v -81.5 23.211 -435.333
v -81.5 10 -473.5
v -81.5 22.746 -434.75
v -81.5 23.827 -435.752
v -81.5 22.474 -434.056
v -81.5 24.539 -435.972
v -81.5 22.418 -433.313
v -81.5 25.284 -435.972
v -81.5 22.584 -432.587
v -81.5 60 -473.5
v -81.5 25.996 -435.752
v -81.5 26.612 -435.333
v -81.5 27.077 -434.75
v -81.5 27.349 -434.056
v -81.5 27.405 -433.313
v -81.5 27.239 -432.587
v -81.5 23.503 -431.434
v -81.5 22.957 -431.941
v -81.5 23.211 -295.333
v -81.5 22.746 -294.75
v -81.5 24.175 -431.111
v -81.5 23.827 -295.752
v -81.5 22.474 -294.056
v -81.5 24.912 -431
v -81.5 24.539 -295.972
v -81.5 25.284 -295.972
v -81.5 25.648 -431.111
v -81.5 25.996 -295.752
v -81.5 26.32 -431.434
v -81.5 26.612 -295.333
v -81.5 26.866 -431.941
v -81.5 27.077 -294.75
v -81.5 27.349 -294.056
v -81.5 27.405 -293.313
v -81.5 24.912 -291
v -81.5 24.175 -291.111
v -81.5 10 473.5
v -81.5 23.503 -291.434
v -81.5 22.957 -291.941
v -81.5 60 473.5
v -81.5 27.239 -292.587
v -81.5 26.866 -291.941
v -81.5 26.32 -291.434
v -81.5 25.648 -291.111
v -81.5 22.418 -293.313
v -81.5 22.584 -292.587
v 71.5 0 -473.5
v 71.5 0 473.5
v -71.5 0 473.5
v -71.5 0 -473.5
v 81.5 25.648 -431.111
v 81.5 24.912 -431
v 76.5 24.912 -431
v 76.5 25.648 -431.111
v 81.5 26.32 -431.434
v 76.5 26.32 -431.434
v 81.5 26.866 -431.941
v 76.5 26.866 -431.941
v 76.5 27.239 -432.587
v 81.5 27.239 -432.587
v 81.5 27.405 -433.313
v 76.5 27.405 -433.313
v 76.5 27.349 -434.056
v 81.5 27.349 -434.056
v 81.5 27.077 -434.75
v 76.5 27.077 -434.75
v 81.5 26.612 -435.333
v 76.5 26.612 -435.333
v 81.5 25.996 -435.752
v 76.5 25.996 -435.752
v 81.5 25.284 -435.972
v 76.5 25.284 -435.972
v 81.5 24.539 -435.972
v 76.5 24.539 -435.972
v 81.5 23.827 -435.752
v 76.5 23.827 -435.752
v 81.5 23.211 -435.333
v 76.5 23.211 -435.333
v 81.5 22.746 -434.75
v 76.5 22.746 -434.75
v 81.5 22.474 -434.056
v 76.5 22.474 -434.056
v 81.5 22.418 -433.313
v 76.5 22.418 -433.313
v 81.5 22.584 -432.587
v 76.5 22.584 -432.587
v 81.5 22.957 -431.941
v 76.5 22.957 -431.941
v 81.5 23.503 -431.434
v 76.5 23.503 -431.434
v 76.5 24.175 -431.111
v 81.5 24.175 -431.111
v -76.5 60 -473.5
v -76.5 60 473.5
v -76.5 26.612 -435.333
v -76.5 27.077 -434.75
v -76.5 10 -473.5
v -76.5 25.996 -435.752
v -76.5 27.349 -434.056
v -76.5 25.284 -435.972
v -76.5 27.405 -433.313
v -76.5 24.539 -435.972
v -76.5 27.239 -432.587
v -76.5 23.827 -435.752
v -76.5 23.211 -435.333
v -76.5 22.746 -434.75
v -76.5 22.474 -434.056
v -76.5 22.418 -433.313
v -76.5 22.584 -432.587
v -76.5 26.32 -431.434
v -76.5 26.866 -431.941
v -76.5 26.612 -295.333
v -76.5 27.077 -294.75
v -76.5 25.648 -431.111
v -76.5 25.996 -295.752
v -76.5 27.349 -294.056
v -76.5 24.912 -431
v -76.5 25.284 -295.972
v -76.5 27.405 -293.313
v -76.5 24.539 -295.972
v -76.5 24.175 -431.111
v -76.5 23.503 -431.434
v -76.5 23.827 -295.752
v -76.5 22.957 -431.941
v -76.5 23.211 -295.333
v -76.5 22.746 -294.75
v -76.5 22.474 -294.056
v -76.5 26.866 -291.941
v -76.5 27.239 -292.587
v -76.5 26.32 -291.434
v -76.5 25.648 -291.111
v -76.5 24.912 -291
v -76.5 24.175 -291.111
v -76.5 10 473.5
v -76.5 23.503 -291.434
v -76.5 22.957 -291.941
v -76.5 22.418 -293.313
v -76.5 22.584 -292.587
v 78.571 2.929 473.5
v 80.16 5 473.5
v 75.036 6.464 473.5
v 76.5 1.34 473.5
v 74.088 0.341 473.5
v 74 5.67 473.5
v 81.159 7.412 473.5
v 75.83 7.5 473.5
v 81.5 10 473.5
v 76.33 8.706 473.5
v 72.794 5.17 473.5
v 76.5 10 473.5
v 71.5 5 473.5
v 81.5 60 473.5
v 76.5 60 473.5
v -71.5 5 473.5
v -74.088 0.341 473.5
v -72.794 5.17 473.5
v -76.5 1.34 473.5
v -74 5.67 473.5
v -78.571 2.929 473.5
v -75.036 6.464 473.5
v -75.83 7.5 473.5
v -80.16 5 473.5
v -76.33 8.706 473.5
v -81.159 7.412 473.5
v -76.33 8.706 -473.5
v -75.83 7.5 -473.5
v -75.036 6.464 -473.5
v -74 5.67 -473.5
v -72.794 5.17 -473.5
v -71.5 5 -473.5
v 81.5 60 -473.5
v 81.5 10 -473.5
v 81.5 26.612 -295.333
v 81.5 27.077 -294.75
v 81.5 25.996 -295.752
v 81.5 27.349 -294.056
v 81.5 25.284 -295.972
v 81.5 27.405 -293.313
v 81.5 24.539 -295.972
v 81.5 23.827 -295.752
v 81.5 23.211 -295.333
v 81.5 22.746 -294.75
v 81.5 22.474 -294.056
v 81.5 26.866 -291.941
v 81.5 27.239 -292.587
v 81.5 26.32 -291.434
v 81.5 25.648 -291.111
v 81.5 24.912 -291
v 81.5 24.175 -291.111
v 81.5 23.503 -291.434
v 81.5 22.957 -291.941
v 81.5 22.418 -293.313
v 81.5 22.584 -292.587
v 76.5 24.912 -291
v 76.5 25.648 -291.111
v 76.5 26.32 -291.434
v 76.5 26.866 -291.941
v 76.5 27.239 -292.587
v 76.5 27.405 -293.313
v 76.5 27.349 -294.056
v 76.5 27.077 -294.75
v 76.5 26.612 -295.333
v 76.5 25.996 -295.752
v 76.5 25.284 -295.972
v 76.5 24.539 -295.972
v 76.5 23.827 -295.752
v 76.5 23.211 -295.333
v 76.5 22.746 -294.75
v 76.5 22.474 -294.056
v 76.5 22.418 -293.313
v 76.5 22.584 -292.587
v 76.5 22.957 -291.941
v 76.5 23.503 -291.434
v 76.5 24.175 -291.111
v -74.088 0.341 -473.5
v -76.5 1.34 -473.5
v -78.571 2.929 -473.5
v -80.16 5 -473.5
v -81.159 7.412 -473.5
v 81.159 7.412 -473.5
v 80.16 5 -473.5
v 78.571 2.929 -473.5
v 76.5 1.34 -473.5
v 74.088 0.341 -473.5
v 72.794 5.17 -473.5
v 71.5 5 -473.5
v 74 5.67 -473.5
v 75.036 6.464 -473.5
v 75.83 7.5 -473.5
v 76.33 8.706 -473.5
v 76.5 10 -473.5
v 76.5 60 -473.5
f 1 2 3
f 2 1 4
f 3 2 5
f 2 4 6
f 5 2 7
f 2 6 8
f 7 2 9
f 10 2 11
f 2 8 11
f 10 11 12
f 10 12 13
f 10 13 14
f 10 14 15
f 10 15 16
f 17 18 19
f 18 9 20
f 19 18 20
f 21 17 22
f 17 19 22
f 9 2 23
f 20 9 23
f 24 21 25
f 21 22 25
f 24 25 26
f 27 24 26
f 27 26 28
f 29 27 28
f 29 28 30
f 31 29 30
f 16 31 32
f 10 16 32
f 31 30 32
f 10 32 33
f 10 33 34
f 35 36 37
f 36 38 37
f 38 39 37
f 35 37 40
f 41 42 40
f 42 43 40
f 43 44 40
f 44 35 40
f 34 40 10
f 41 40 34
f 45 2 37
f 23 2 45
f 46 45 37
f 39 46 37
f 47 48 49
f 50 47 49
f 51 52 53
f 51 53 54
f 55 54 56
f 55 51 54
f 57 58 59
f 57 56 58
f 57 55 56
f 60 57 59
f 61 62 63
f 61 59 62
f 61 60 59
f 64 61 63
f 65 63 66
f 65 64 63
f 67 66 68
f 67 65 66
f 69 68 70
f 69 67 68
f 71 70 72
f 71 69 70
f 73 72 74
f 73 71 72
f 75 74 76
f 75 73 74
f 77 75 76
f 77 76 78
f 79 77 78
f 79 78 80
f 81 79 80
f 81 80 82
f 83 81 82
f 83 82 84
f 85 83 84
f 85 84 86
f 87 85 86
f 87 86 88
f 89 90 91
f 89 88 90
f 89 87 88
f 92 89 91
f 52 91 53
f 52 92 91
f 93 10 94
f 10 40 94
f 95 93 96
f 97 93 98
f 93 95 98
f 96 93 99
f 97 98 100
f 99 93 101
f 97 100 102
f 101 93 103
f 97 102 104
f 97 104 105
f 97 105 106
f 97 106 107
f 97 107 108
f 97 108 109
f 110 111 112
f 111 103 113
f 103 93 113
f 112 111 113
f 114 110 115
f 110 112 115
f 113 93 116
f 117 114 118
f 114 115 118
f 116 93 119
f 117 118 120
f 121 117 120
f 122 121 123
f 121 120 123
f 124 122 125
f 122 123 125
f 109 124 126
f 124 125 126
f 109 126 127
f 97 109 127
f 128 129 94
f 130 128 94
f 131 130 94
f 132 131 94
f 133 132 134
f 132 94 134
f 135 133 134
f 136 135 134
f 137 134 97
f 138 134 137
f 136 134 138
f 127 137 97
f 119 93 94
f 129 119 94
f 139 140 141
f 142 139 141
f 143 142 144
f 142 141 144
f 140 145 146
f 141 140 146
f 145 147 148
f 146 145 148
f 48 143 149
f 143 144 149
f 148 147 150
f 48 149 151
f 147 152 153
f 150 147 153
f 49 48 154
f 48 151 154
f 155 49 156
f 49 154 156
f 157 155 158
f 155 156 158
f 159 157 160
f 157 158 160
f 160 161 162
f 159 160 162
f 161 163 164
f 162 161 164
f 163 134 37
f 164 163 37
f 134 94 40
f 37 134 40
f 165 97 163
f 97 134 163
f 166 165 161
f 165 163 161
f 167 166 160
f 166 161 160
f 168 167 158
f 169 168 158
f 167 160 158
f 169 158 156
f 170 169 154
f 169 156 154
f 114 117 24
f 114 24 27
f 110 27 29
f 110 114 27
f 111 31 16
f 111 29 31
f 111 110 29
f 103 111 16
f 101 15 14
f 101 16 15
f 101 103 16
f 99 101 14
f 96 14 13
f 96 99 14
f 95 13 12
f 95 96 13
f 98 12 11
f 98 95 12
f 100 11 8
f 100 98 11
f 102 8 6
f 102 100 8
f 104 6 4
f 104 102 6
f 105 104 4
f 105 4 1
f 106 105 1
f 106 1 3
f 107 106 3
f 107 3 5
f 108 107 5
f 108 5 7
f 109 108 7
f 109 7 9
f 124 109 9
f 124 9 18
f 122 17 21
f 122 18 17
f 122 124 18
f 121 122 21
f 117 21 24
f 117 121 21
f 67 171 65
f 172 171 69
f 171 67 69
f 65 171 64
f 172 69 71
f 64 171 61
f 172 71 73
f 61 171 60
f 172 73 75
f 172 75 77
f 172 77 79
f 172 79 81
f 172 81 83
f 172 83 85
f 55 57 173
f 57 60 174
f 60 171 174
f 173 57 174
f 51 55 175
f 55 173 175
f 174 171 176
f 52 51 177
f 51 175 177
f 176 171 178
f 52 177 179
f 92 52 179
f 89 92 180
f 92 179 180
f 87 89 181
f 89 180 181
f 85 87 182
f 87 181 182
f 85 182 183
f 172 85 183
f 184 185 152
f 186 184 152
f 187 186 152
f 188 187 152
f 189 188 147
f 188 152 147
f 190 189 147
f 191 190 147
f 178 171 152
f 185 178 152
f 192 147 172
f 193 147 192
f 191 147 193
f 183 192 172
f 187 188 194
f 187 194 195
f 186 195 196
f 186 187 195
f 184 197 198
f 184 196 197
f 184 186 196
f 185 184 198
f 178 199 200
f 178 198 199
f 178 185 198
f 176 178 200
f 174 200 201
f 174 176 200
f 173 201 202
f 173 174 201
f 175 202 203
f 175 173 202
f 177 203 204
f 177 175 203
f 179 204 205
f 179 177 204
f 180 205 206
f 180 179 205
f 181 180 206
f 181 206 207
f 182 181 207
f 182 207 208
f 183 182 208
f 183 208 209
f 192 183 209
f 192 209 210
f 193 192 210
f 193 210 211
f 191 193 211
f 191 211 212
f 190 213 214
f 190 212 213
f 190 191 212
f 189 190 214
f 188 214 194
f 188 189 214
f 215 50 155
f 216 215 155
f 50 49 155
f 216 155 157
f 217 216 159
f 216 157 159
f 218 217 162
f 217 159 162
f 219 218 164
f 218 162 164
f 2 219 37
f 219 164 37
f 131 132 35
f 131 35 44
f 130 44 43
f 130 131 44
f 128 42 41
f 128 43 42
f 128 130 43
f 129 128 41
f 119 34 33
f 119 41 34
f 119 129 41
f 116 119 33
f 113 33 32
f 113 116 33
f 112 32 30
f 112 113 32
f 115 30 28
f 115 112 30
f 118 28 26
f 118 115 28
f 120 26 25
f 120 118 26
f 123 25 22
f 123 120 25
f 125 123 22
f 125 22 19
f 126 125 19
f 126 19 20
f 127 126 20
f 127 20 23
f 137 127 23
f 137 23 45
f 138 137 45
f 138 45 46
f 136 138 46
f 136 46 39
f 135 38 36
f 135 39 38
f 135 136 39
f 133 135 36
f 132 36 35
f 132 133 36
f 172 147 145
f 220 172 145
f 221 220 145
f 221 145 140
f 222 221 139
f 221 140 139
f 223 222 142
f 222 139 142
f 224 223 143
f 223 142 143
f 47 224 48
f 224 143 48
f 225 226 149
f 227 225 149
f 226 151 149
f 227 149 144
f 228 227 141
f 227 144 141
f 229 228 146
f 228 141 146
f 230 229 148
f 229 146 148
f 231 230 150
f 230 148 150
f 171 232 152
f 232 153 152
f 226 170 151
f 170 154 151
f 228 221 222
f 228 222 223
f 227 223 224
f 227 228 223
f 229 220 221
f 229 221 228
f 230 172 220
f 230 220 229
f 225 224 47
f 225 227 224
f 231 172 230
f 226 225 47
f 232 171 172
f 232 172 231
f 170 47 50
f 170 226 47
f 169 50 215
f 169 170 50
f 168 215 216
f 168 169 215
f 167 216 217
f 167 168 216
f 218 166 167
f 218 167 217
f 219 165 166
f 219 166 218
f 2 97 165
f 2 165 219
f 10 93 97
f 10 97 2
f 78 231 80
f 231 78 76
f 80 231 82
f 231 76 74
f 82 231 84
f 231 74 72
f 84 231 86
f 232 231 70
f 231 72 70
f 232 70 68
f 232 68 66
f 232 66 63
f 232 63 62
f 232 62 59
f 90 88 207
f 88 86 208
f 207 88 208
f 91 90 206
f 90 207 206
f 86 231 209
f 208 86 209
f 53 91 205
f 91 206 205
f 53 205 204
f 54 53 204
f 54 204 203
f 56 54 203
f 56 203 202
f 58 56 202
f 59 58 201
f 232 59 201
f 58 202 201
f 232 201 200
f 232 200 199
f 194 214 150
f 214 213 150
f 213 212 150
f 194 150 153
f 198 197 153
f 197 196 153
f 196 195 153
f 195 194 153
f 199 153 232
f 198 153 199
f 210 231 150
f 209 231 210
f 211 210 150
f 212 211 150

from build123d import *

# Parameters (mm, degrees)
EXTRUDE_1_DEPTH          = 473.5
CUT_EXTRUDE_1_DEPTH      = 505.35230742
CUT_EXTRUDE_1_DEPTH_BACK = 505.35230742
SKETCH_2_R               = 2.5


with BuildPart() as part:
    # Эскиз1 → Бобышка-Вытянуть1 (new, symmetric)
    with BuildSketch(Plane.XY):
        with BuildLine():
            Line((71.5, 0), (-71.5, 0))
            ThreePointArc((-71.5, 0), (-78.571067812, 2.928932188), (-81.5, 10))
            Line((-81.5, 10), (-81.5, 60))
            Line((-81.5, 60), (-76.5, 60))
            Line((-76.5, 60), (-76.5, 10))
            ThreePointArc((-76.5, 10), (-75.035533906, 6.464466094), (-71.5, 5))
            Line((-71.5, 5), (71.5, 5))
            ThreePointArc((71.5, 5), (75.035533906, 6.464466094), (76.5, 10))
            Line((76.5, 10), (76.5, 60))
            Line((76.5, 60), (81.5, 60))
            Line((81.5, 60), (81.5, 10))
            ThreePointArc((81.5, 10), (78.571067812, 2.928932188), (71.5, 0))
        make_face()
    extrude(amount=EXTRUDE_1_DEPTH, both=True)

    # Эскиз2 → Вырез-Вытянуть1 (cut, two sides: drawn at the far end of the back side and taken through both)
    with BuildSketch(Plane.ZY.offset(81.5).offset(-CUT_EXTRUDE_1_DEPTH_BACK)):
        with Locations((-433.5, 24.9115)):
            Circle(SKETCH_2_R)
        with Locations((-293.5, 24.9115)):
            Circle(SKETCH_2_R)
    extrude(amount=CUT_EXTRUDE_1_DEPTH + CUT_EXTRUDE_1_DEPTH_BACK, mode=Mode.SUBTRACT)


solid = part.part
